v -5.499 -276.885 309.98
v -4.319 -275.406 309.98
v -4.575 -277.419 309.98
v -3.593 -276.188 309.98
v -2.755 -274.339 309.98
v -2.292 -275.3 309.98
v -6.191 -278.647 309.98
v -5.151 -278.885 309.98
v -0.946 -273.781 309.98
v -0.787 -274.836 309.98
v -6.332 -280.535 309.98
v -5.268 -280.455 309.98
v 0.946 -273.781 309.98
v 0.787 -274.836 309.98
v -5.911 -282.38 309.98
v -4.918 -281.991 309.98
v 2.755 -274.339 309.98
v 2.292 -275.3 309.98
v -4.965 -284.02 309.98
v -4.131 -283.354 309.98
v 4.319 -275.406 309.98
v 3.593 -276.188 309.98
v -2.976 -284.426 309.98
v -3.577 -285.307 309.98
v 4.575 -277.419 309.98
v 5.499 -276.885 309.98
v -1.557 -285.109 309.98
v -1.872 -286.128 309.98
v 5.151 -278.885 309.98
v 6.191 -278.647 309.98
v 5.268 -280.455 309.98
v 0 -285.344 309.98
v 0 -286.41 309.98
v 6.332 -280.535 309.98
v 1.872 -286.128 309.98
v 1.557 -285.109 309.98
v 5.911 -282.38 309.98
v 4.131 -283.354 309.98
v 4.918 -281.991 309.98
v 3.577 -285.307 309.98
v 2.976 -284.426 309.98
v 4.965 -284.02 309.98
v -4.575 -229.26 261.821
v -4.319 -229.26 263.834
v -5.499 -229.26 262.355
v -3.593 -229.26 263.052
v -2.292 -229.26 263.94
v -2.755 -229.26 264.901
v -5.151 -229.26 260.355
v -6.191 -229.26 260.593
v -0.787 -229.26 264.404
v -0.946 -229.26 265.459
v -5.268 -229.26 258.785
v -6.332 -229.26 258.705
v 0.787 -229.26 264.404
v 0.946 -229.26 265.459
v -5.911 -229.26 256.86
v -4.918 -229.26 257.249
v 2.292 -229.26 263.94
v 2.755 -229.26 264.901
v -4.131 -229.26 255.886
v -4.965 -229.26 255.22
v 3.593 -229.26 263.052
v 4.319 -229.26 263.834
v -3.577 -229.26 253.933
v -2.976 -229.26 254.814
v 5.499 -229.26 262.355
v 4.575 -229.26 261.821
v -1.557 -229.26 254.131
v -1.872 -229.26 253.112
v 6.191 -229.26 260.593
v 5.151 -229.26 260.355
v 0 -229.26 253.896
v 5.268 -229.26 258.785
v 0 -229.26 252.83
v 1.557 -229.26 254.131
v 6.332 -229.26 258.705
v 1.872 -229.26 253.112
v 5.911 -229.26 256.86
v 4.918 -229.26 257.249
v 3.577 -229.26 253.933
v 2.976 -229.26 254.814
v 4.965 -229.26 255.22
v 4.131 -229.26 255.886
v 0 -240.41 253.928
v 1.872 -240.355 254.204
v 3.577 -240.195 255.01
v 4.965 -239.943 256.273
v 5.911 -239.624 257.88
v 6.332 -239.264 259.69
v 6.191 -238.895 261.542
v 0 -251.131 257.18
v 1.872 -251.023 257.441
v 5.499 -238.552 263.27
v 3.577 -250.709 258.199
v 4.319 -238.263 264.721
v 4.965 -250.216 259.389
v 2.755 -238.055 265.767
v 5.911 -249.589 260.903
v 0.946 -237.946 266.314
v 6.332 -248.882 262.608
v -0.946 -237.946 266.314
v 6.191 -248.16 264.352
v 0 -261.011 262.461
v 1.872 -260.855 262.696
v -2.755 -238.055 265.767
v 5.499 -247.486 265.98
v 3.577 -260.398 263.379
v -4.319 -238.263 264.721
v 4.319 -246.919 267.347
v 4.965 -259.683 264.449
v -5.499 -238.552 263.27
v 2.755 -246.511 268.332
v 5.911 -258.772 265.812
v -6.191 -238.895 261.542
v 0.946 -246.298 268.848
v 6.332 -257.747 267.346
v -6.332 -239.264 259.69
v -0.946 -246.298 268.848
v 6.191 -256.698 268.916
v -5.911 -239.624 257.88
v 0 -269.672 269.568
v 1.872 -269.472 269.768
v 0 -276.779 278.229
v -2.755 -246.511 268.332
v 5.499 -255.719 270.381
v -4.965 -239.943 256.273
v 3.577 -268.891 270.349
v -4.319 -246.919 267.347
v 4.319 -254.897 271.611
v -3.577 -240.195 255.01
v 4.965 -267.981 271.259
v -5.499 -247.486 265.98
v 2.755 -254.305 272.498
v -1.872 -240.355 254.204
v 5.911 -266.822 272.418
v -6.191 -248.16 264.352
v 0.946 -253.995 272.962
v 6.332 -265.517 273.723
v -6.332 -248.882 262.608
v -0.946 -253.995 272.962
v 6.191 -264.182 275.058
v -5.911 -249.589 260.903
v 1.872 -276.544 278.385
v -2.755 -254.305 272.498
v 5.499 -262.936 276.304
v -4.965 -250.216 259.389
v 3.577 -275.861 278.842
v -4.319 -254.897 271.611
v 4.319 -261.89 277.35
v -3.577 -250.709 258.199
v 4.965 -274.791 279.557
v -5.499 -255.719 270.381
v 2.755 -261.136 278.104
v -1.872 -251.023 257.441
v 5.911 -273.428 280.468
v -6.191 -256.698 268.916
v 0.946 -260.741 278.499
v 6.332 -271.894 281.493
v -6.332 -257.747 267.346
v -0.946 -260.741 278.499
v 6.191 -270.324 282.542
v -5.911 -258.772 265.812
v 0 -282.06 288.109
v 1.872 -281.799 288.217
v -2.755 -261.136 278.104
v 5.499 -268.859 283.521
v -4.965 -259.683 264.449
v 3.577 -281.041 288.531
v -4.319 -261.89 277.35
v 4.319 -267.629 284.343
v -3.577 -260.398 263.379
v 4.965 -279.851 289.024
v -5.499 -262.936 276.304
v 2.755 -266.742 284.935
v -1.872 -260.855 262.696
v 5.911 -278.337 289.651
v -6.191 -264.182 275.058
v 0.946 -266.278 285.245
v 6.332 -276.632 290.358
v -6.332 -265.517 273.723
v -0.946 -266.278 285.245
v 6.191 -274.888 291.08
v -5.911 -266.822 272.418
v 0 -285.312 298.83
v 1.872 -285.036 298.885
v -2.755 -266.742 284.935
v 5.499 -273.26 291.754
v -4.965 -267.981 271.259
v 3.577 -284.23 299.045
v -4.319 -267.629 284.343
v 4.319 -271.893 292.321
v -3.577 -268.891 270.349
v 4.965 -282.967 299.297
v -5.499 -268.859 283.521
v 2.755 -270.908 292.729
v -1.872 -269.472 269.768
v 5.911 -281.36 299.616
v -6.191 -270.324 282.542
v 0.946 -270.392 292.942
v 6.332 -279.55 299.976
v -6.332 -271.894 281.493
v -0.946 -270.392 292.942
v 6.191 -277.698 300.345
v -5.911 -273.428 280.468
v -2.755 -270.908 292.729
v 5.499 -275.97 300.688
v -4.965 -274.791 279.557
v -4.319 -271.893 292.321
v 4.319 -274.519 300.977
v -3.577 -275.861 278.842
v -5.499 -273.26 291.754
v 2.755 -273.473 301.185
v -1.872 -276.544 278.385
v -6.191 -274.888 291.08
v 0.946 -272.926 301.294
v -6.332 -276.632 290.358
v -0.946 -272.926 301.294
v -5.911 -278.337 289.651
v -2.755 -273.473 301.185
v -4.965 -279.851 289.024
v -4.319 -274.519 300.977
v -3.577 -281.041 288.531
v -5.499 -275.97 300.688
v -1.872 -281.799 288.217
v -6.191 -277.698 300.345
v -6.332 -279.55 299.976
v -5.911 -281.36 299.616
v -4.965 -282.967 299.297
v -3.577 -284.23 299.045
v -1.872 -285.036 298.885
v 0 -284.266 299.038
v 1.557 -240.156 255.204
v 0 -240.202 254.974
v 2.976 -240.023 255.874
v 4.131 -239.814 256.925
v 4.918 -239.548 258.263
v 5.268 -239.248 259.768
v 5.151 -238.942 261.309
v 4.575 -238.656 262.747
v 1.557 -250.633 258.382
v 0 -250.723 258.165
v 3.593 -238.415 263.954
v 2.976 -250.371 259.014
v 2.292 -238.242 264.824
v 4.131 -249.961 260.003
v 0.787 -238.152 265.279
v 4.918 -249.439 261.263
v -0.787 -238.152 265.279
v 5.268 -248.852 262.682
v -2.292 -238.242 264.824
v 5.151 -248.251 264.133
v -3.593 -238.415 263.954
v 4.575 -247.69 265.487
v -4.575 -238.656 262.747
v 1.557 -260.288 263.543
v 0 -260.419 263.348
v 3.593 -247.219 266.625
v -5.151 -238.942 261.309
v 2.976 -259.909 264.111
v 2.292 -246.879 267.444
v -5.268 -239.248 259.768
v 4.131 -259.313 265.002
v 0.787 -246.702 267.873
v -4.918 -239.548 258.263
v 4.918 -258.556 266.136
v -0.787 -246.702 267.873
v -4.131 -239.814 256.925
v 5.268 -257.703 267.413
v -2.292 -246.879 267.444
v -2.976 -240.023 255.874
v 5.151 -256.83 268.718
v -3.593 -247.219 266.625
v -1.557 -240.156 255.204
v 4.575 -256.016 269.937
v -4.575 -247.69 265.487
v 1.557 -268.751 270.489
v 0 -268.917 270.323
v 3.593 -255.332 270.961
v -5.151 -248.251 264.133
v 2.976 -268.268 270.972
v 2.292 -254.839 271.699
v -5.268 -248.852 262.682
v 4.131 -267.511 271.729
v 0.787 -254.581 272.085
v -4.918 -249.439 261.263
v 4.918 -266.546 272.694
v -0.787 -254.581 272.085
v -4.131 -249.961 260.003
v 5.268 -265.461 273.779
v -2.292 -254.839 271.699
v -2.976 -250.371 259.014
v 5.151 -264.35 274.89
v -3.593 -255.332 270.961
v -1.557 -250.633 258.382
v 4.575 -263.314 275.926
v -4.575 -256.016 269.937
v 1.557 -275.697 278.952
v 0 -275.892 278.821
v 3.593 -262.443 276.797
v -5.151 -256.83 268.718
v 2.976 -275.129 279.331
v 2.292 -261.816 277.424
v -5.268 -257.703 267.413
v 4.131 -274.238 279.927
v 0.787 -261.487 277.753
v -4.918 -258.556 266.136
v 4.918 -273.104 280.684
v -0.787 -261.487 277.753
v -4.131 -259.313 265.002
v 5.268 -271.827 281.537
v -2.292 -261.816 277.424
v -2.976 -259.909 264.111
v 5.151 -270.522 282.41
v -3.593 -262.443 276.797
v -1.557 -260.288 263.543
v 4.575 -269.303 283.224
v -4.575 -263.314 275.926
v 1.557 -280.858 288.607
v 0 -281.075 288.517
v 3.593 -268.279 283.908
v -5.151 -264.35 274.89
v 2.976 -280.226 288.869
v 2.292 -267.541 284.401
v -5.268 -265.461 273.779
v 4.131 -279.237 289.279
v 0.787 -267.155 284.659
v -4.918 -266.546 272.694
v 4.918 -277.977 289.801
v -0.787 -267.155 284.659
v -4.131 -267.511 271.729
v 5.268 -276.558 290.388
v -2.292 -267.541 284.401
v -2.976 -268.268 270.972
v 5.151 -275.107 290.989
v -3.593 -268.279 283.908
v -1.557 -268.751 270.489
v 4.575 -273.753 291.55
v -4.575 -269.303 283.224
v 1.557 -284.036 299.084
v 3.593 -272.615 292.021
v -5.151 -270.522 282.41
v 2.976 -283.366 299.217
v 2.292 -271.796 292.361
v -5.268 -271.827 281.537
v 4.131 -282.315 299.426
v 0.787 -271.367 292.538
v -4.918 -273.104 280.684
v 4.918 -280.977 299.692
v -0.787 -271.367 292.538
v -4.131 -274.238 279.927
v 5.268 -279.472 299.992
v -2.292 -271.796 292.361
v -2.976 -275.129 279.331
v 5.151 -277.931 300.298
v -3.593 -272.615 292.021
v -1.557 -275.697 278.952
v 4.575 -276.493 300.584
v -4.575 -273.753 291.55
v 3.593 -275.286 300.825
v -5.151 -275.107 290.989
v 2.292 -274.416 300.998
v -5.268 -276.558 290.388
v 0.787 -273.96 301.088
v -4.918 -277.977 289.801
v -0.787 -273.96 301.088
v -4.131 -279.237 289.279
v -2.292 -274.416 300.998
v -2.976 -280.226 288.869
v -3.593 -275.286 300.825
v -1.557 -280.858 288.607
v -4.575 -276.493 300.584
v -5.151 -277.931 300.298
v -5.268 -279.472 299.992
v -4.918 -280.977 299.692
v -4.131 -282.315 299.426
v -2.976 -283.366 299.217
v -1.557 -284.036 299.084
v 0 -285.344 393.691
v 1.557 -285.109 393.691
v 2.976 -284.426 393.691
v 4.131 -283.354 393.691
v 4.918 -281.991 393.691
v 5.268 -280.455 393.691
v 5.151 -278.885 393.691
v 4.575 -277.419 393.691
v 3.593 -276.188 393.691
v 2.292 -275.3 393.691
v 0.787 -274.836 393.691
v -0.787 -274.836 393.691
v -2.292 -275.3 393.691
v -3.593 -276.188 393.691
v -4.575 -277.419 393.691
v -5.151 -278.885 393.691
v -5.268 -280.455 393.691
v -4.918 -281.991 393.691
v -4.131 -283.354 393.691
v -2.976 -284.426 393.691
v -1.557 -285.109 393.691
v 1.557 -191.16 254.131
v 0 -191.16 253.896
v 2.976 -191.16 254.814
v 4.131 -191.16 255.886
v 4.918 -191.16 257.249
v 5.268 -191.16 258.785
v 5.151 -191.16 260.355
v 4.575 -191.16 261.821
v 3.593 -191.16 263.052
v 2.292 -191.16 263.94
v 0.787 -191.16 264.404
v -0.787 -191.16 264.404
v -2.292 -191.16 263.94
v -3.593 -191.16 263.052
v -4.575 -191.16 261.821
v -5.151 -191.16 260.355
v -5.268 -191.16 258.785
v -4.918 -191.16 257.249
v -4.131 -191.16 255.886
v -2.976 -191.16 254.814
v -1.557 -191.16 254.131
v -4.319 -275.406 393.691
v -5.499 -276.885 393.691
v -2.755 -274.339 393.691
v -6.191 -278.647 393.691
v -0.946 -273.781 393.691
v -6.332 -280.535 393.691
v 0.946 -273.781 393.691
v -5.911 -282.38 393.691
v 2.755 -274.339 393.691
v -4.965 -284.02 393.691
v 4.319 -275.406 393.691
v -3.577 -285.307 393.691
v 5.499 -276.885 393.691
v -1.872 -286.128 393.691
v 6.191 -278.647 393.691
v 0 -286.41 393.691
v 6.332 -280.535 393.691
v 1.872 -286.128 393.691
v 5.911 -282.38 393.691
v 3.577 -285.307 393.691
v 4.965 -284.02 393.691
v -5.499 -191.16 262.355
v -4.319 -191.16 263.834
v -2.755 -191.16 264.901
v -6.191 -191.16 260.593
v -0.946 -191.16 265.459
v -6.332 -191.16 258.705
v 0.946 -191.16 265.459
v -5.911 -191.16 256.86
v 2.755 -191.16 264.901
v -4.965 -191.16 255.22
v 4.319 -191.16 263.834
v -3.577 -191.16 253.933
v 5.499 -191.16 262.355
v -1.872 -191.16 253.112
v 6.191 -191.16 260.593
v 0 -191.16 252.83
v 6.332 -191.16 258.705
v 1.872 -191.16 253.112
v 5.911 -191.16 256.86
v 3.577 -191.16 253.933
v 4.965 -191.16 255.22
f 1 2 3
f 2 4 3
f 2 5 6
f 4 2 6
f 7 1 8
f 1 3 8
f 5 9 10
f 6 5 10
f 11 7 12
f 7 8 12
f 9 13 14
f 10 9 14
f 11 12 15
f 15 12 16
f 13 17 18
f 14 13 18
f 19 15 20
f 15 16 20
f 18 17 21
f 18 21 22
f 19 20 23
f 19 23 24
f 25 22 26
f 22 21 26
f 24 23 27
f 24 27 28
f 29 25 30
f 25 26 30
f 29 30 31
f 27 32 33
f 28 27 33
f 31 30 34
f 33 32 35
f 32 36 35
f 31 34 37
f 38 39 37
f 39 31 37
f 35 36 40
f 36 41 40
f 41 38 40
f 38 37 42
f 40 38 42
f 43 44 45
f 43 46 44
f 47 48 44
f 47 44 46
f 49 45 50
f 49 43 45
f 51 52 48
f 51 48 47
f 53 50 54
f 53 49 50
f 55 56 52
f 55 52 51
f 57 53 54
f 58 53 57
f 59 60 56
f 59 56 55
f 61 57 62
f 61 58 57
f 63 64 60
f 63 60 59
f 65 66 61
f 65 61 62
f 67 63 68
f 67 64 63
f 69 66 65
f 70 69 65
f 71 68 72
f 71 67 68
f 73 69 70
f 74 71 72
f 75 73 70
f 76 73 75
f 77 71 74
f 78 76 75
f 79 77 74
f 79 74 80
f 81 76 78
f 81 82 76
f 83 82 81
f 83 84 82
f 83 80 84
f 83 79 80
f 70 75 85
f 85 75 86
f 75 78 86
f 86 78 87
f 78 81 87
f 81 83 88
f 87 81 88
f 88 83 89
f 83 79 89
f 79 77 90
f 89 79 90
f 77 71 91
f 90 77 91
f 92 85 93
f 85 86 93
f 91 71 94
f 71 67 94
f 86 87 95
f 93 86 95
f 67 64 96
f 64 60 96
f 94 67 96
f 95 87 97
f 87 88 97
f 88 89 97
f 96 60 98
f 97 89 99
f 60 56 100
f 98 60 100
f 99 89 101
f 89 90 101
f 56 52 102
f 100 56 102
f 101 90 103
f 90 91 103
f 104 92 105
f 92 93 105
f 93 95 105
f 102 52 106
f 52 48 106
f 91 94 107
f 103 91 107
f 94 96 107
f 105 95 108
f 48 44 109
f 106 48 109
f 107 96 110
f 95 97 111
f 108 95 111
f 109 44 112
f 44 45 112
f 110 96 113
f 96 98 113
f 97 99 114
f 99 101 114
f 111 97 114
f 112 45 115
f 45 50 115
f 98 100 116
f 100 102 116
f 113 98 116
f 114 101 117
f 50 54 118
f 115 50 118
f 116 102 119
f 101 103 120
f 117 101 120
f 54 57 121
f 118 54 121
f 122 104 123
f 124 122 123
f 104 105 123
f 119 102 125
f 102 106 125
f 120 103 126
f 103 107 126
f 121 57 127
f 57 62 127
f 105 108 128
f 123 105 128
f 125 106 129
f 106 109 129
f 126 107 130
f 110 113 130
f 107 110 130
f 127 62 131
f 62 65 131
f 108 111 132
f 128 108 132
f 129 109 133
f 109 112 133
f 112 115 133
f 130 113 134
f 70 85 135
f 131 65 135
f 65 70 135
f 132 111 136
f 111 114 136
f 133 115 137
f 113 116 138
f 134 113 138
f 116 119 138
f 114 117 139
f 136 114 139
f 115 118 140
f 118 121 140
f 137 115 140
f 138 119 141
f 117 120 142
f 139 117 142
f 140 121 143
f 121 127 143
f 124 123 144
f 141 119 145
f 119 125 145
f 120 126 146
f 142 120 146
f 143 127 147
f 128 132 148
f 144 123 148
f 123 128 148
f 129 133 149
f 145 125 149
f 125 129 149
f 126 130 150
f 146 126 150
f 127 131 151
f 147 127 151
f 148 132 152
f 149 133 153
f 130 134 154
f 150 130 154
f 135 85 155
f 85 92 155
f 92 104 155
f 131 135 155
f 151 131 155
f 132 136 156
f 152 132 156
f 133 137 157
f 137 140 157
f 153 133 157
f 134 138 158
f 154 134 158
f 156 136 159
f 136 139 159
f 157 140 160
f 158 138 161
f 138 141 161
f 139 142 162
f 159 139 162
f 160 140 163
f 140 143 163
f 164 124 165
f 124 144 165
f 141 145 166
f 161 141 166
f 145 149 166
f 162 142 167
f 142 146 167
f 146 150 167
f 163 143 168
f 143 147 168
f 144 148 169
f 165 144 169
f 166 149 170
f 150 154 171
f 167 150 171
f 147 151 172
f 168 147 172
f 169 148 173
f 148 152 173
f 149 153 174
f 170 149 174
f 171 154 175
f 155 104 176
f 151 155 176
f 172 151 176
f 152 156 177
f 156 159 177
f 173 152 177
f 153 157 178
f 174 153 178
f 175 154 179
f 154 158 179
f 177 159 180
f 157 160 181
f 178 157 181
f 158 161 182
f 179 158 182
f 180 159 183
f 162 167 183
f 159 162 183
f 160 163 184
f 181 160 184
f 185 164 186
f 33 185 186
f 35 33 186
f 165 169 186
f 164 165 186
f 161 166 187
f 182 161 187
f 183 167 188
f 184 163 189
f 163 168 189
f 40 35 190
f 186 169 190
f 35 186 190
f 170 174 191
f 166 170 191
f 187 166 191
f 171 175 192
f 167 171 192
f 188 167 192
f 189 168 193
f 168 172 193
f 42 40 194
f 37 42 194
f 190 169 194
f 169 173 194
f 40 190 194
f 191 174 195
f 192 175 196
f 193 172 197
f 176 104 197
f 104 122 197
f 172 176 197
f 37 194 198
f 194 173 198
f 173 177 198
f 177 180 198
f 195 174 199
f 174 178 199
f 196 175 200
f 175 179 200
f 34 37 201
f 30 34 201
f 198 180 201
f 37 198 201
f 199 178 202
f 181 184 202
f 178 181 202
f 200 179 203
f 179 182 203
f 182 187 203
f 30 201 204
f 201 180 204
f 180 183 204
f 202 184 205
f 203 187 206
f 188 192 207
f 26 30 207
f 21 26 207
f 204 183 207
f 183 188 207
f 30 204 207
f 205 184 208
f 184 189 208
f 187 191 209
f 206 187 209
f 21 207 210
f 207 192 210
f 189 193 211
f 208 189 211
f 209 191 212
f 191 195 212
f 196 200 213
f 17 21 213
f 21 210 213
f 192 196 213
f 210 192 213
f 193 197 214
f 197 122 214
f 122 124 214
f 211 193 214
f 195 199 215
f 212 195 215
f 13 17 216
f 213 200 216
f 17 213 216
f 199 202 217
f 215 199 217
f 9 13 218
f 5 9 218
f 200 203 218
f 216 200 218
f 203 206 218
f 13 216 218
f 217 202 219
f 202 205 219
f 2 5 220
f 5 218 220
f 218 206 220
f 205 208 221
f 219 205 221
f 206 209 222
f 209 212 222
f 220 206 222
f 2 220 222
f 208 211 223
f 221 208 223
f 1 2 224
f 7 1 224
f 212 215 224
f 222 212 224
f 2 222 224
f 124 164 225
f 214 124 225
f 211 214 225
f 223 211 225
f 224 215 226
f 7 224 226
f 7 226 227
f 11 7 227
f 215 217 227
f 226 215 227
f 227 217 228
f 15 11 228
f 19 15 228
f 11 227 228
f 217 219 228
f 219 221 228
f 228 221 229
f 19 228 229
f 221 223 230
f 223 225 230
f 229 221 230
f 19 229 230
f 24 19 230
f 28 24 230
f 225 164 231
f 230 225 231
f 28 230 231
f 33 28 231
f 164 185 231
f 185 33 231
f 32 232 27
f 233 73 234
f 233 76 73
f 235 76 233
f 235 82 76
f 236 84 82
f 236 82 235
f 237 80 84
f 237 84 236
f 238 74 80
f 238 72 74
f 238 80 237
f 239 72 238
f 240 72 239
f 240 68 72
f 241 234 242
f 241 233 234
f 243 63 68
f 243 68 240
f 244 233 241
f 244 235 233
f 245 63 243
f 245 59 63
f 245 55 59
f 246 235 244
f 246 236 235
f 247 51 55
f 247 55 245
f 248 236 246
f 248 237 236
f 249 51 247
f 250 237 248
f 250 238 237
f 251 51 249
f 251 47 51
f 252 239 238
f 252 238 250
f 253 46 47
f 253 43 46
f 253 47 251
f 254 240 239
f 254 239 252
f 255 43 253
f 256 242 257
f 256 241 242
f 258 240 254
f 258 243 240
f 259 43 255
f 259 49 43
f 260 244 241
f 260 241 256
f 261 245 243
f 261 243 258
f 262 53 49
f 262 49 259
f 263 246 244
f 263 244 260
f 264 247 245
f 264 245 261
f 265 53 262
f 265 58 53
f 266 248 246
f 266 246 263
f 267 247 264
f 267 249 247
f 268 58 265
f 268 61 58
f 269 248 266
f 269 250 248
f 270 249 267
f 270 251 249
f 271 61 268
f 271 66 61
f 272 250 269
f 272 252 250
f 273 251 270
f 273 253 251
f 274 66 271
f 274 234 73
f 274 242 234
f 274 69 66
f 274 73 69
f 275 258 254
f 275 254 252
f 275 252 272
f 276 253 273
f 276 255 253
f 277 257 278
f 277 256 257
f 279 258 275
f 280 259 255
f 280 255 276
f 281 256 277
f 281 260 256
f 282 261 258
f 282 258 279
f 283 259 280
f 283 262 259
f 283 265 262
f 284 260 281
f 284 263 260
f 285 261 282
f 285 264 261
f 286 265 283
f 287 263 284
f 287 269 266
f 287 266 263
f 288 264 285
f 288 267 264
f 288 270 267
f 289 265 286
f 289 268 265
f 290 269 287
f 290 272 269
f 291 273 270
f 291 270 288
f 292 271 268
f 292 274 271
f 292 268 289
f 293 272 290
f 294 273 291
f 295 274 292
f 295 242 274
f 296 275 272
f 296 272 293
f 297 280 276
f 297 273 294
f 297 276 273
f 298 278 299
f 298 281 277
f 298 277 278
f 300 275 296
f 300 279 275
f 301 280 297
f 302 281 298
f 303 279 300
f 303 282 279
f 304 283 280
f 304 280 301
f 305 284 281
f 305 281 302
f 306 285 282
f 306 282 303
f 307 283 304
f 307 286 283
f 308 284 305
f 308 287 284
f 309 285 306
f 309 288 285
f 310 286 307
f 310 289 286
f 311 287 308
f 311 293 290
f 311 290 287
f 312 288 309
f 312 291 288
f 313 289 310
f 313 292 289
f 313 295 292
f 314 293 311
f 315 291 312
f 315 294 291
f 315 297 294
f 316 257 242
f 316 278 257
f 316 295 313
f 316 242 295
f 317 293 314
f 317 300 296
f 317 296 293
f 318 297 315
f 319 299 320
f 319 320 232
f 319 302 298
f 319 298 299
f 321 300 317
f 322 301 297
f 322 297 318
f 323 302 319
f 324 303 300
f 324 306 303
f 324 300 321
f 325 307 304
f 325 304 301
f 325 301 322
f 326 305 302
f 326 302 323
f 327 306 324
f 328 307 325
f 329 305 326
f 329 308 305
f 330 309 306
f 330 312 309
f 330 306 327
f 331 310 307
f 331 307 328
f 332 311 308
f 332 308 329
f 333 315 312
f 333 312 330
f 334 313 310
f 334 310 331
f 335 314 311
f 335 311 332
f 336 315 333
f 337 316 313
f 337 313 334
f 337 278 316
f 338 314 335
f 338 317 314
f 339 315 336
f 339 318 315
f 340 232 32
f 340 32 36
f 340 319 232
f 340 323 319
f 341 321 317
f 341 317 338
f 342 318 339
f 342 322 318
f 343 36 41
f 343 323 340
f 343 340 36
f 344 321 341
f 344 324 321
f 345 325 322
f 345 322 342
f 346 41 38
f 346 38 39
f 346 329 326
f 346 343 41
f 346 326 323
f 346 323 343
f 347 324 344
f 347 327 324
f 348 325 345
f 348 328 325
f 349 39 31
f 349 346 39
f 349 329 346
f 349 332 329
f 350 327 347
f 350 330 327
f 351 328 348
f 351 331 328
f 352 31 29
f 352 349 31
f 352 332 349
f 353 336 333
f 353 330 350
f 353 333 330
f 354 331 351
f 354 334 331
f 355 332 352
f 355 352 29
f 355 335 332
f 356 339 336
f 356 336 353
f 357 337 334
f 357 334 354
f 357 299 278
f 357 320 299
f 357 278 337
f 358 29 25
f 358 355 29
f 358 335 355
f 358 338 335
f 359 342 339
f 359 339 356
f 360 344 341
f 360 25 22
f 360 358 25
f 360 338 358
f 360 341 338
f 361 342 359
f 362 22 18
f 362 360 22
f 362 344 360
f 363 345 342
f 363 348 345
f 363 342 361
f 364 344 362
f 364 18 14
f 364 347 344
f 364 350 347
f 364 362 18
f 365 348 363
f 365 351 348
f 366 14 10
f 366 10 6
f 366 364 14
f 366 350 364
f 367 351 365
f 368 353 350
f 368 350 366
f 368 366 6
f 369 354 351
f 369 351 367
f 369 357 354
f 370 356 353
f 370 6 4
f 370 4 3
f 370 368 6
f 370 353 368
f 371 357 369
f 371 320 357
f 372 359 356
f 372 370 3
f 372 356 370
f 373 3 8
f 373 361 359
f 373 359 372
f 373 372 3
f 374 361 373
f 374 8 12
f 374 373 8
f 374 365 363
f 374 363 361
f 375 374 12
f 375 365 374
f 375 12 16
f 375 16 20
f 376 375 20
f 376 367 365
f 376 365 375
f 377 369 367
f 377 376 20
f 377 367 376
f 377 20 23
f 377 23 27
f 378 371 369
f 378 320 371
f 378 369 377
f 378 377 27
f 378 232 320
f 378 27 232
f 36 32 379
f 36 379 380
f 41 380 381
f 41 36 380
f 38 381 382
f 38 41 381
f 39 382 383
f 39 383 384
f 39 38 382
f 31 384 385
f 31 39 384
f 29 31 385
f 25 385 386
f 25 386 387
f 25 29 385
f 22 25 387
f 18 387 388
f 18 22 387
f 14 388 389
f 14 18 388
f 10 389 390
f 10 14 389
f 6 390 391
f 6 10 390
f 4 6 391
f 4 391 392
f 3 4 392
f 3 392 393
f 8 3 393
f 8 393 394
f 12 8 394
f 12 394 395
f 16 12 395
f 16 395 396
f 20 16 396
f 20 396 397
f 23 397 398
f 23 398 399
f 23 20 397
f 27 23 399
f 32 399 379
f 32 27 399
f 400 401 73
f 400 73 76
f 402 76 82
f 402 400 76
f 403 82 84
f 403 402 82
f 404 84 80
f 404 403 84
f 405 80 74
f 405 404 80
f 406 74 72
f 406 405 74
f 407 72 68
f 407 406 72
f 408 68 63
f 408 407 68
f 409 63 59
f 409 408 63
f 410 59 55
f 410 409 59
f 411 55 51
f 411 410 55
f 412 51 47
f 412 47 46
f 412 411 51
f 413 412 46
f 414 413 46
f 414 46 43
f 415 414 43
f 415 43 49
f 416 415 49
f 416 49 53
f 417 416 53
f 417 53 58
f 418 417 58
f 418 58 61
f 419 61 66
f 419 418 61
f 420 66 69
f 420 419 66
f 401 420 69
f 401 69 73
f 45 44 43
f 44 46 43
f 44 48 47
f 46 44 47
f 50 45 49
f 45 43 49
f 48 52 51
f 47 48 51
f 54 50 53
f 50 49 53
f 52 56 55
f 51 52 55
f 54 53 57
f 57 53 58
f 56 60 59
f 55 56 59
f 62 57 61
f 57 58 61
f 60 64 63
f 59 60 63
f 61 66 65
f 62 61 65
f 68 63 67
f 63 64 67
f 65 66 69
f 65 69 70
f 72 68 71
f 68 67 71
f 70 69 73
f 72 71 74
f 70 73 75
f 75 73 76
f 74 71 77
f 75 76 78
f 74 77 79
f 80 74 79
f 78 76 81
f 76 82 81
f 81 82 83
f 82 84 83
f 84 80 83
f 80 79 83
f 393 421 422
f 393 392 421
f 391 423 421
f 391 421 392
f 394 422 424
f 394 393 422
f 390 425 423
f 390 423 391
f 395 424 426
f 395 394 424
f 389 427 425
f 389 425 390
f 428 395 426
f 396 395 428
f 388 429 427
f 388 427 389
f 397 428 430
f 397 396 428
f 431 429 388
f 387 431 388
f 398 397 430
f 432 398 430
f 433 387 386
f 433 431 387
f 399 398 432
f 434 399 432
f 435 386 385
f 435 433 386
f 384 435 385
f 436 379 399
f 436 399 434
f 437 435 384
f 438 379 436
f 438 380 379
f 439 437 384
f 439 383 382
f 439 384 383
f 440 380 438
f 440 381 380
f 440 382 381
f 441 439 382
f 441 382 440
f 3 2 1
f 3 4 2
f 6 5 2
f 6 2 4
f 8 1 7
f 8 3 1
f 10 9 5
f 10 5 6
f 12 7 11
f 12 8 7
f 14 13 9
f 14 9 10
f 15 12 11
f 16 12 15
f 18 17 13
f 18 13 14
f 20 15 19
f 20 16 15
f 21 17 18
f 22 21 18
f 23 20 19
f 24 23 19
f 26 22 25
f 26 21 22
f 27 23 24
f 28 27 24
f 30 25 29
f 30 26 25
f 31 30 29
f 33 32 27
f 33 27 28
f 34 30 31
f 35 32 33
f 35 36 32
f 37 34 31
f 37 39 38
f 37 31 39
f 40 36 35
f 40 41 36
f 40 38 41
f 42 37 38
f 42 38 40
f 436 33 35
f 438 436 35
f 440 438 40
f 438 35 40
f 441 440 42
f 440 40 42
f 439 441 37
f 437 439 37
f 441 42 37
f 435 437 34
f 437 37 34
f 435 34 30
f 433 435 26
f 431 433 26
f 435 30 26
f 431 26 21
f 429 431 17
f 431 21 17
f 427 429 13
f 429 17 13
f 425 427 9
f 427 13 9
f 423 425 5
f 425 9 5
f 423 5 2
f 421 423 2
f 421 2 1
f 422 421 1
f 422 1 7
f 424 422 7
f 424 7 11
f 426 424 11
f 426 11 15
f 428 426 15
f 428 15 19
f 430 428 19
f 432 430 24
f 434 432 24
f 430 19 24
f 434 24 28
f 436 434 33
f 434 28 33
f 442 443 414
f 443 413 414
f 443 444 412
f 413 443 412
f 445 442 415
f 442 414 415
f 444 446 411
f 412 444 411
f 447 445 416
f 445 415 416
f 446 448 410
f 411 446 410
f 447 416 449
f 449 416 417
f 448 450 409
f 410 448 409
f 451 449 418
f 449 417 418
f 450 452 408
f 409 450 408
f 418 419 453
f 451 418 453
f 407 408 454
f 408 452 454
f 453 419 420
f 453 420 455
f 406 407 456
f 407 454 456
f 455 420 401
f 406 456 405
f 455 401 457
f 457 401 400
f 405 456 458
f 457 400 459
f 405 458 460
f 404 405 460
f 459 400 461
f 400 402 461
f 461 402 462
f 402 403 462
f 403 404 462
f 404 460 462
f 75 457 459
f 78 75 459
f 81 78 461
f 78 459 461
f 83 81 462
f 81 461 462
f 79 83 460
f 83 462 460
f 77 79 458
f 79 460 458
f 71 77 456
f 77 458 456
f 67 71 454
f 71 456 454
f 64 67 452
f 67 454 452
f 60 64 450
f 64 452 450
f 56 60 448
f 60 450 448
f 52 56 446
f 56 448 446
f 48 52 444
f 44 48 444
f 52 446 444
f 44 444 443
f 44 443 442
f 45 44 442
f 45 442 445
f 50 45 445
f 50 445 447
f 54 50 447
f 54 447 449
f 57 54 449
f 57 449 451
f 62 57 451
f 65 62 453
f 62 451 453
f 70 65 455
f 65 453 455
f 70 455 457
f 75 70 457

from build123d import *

# Parameters (mm, degrees)
SKETCH1_R                 = 6.35
SKETCH1_R_2               = 5.2832
PIPE_0_5_SCH_40_1_DEPTH   = 38.1
SKETCH1_ON_SEGMENT_2_R    = 6.35
SKETCH1_ON_SEGMENT_2_R_2  = 5.2832
PIPE_0_5_SCH_40_1_2_ANGLE = 90
SKETCH1_ON_SEGMENT_3_R    = 6.35
SKETCH1_ON_SEGMENT_3_R_2  = 5.2832
PIPE_0_5_SCH_40_1_3_DEPTH = 83.711153487


with BuildPart() as part:
    # Sketch1 → Pipe 0.5 SCH 40(1) (new body)
    with BuildSketch(Plane(origin=(0, -191.160399283, 259.179579455), x_dir=(0, 0, -1), z_dir=(0, -1, 0))):
        Circle(SKETCH1_R)
        Circle(SKETCH1_R_2, mode=Mode.SUBTRACT)
    extrude(amount=PIPE_0_5_SCH_40_1_DEPTH)


with BuildPart() as body_2:
    # Sketch1 on segment 2 (carried to the start of arc 2) → Pipe 0.5 SCH 40_1 2 (revolve)
    with BuildSketch(Plane(origin=(0, -229.260399283, 259.179579455), x_dir=(0, 0, -1), z_dir=(0, -1, 0))):
        Circle(SKETCH1_ON_SEGMENT_2_R)
        Circle(SKETCH1_ON_SEGMENT_2_R_2, mode=Mode.SUBTRACT)
    revolve(axis=Axis((0, -229.260399283, 309.979579455), (-1, 0, 0)), revolution_arc=PIPE_0_5_SCH_40_1_2_ANGLE)


with BuildPart() as body_3:
    # Sketch1 on segment 3 (carried to segment 3) → Pipe 0.5 SCH 40_1 3 (new body)
    with BuildSketch(Plane(origin=(0, -280.060399283, 309.979579455), x_dir=(0, -1, 0), z_dir=(0, 0, 1))):
        Circle(SKETCH1_ON_SEGMENT_3_R)
        Circle(SKETCH1_ON_SEGMENT_3_R_2, mode=Mode.SUBTRACT)
    extrude(amount=PIPE_0_5_SCH_40_1_3_DEPTH)


solid = Compound([part.part, body_2.part, body_3.part])
